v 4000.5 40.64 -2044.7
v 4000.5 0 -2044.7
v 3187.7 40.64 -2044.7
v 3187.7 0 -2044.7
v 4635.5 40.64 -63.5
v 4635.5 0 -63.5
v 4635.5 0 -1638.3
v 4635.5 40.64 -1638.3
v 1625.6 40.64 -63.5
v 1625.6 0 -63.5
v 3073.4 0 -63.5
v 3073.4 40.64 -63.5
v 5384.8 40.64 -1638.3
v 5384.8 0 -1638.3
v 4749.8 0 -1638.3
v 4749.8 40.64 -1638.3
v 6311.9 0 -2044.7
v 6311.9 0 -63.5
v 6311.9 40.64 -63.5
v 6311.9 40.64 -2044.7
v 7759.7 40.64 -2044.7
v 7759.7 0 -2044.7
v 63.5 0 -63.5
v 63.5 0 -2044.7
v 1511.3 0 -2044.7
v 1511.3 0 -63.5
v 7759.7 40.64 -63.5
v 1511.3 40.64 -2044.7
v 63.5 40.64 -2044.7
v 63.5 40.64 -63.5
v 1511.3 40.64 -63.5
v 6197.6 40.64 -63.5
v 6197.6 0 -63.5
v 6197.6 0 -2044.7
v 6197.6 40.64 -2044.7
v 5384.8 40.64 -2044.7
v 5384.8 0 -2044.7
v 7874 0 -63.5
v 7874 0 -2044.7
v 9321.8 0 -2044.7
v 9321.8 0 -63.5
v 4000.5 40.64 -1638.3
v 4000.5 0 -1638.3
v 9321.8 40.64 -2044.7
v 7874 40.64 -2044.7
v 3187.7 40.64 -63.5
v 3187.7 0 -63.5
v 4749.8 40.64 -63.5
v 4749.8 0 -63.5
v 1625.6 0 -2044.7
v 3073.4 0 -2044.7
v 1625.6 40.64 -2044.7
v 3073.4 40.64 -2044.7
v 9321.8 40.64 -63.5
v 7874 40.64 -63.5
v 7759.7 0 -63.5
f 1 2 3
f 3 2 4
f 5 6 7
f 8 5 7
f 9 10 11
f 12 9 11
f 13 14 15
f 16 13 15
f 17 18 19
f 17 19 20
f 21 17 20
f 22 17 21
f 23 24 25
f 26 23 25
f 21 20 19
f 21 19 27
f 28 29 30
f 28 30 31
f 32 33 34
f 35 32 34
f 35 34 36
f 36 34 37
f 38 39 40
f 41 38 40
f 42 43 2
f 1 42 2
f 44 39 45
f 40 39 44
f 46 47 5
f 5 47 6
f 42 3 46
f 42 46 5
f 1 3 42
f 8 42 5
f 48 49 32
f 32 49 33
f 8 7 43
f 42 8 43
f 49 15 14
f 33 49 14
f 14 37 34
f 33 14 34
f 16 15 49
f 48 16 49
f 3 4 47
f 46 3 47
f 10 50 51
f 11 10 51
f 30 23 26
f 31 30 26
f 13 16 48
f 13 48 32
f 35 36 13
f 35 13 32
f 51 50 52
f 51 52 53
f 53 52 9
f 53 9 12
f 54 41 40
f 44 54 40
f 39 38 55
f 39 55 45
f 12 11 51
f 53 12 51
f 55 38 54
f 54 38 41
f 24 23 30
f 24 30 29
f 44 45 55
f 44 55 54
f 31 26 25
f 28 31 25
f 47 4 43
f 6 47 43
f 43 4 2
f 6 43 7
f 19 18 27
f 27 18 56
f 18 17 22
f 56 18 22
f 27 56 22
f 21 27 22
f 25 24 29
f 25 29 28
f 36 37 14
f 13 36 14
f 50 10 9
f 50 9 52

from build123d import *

# Parameters (mm, degrees)
SKETCH2_W             = 1447.8
SKETCH2_H             = 1981.2
BOSS_EXTRUDE1_DEPTH   = 40.64
BOSS_EXTRUDE1_2_DEPTH = 40.64
BOSS_EXTRUDE1_3_DEPTH = 40.64
BOSS_EXTRUDE1_4_DEPTH = 40.64
BOSS_EXTRUDE1_5_DEPTH = 40.64
BOSS_EXTRUDE1_6_DEPTH = 40.64


with BuildPart() as part:
    # Sketch2 → Boss-Extrude1 (new body)
    with BuildSketch(Plane(origin=(0, 0, 0), x_dir=(1, 0, 0), z_dir=(0, 1, 0))):
        with Locations((787.4, 1054.1)):
            Rectangle(SKETCH2_W, SKETCH2_H)
    extrude(amount=BOSS_EXTRUDE1_DEPTH)


with BuildPart() as body_2:
    # Sketch2 → Boss-Extrude1 2 (new body)
    with BuildSketch(Plane(origin=(0, 0, 0), x_dir=(1, 0, 0), z_dir=(0, 1, 0))):
        with Locations((2349.5, 1054.1)):
            Rectangle(SKETCH2_W, SKETCH2_H)
    extrude(amount=BOSS_EXTRUDE1_2_DEPTH)


with BuildPart() as body_3:
    # Sketch2 → Boss-Extrude1 3 (new body)
    with BuildSketch(Plane(origin=(0, 0, 0), x_dir=(1, 0, 0), z_dir=(0, 1, 0))):
        Polygon((3187.7, 2044.7), (3187.7, 63.5), (4635.5, 63.5), (4635.5, 1638.3), (4000.5, 1638.3), (4000.5, 2044.7), align=None)
    extrude(amount=BOSS_EXTRUDE1_3_DEPTH)


with BuildPart() as body_4:
    # Sketch2 → Boss-Extrude1 4 (new body)
    with BuildSketch(Plane(origin=(0, 0, 0), x_dir=(1, 0, 0), z_dir=(0, 1, 0))):
        Polygon((6197.6, 2044.7), (5384.8, 2044.7), (5384.8, 1638.3), (4749.8, 1638.3), (4749.8, 63.5), (6197.6, 63.5), align=None)
    extrude(amount=BOSS_EXTRUDE1_4_DEPTH)


with BuildPart() as body_5:
    # Sketch2 → Boss-Extrude1 5 (new body)
    with BuildSketch(Plane(origin=(0, 0, 0), x_dir=(1, 0, 0), z_dir=(0, 1, 0))):
        with Locations((7035.8, 1054.1)):
            Rectangle(SKETCH2_W, SKETCH2_H)
    extrude(amount=BOSS_EXTRUDE1_5_DEPTH)


with BuildPart() as body_6:
    # Sketch2 → Boss-Extrude1 6 (new body)
    with BuildSketch(Plane(origin=(0, 0, 0), x_dir=(1, 0, 0), z_dir=(0, 1, 0))):
        with Locations((8597.9, 1054.1)):
            Rectangle(SKETCH2_W, SKETCH2_H)
    extrude(amount=BOSS_EXTRUDE1_6_DEPTH)


solid = Compound([part.part, body_2.part, body_3.part, body_4.part, body_5.part, body_6.part])
